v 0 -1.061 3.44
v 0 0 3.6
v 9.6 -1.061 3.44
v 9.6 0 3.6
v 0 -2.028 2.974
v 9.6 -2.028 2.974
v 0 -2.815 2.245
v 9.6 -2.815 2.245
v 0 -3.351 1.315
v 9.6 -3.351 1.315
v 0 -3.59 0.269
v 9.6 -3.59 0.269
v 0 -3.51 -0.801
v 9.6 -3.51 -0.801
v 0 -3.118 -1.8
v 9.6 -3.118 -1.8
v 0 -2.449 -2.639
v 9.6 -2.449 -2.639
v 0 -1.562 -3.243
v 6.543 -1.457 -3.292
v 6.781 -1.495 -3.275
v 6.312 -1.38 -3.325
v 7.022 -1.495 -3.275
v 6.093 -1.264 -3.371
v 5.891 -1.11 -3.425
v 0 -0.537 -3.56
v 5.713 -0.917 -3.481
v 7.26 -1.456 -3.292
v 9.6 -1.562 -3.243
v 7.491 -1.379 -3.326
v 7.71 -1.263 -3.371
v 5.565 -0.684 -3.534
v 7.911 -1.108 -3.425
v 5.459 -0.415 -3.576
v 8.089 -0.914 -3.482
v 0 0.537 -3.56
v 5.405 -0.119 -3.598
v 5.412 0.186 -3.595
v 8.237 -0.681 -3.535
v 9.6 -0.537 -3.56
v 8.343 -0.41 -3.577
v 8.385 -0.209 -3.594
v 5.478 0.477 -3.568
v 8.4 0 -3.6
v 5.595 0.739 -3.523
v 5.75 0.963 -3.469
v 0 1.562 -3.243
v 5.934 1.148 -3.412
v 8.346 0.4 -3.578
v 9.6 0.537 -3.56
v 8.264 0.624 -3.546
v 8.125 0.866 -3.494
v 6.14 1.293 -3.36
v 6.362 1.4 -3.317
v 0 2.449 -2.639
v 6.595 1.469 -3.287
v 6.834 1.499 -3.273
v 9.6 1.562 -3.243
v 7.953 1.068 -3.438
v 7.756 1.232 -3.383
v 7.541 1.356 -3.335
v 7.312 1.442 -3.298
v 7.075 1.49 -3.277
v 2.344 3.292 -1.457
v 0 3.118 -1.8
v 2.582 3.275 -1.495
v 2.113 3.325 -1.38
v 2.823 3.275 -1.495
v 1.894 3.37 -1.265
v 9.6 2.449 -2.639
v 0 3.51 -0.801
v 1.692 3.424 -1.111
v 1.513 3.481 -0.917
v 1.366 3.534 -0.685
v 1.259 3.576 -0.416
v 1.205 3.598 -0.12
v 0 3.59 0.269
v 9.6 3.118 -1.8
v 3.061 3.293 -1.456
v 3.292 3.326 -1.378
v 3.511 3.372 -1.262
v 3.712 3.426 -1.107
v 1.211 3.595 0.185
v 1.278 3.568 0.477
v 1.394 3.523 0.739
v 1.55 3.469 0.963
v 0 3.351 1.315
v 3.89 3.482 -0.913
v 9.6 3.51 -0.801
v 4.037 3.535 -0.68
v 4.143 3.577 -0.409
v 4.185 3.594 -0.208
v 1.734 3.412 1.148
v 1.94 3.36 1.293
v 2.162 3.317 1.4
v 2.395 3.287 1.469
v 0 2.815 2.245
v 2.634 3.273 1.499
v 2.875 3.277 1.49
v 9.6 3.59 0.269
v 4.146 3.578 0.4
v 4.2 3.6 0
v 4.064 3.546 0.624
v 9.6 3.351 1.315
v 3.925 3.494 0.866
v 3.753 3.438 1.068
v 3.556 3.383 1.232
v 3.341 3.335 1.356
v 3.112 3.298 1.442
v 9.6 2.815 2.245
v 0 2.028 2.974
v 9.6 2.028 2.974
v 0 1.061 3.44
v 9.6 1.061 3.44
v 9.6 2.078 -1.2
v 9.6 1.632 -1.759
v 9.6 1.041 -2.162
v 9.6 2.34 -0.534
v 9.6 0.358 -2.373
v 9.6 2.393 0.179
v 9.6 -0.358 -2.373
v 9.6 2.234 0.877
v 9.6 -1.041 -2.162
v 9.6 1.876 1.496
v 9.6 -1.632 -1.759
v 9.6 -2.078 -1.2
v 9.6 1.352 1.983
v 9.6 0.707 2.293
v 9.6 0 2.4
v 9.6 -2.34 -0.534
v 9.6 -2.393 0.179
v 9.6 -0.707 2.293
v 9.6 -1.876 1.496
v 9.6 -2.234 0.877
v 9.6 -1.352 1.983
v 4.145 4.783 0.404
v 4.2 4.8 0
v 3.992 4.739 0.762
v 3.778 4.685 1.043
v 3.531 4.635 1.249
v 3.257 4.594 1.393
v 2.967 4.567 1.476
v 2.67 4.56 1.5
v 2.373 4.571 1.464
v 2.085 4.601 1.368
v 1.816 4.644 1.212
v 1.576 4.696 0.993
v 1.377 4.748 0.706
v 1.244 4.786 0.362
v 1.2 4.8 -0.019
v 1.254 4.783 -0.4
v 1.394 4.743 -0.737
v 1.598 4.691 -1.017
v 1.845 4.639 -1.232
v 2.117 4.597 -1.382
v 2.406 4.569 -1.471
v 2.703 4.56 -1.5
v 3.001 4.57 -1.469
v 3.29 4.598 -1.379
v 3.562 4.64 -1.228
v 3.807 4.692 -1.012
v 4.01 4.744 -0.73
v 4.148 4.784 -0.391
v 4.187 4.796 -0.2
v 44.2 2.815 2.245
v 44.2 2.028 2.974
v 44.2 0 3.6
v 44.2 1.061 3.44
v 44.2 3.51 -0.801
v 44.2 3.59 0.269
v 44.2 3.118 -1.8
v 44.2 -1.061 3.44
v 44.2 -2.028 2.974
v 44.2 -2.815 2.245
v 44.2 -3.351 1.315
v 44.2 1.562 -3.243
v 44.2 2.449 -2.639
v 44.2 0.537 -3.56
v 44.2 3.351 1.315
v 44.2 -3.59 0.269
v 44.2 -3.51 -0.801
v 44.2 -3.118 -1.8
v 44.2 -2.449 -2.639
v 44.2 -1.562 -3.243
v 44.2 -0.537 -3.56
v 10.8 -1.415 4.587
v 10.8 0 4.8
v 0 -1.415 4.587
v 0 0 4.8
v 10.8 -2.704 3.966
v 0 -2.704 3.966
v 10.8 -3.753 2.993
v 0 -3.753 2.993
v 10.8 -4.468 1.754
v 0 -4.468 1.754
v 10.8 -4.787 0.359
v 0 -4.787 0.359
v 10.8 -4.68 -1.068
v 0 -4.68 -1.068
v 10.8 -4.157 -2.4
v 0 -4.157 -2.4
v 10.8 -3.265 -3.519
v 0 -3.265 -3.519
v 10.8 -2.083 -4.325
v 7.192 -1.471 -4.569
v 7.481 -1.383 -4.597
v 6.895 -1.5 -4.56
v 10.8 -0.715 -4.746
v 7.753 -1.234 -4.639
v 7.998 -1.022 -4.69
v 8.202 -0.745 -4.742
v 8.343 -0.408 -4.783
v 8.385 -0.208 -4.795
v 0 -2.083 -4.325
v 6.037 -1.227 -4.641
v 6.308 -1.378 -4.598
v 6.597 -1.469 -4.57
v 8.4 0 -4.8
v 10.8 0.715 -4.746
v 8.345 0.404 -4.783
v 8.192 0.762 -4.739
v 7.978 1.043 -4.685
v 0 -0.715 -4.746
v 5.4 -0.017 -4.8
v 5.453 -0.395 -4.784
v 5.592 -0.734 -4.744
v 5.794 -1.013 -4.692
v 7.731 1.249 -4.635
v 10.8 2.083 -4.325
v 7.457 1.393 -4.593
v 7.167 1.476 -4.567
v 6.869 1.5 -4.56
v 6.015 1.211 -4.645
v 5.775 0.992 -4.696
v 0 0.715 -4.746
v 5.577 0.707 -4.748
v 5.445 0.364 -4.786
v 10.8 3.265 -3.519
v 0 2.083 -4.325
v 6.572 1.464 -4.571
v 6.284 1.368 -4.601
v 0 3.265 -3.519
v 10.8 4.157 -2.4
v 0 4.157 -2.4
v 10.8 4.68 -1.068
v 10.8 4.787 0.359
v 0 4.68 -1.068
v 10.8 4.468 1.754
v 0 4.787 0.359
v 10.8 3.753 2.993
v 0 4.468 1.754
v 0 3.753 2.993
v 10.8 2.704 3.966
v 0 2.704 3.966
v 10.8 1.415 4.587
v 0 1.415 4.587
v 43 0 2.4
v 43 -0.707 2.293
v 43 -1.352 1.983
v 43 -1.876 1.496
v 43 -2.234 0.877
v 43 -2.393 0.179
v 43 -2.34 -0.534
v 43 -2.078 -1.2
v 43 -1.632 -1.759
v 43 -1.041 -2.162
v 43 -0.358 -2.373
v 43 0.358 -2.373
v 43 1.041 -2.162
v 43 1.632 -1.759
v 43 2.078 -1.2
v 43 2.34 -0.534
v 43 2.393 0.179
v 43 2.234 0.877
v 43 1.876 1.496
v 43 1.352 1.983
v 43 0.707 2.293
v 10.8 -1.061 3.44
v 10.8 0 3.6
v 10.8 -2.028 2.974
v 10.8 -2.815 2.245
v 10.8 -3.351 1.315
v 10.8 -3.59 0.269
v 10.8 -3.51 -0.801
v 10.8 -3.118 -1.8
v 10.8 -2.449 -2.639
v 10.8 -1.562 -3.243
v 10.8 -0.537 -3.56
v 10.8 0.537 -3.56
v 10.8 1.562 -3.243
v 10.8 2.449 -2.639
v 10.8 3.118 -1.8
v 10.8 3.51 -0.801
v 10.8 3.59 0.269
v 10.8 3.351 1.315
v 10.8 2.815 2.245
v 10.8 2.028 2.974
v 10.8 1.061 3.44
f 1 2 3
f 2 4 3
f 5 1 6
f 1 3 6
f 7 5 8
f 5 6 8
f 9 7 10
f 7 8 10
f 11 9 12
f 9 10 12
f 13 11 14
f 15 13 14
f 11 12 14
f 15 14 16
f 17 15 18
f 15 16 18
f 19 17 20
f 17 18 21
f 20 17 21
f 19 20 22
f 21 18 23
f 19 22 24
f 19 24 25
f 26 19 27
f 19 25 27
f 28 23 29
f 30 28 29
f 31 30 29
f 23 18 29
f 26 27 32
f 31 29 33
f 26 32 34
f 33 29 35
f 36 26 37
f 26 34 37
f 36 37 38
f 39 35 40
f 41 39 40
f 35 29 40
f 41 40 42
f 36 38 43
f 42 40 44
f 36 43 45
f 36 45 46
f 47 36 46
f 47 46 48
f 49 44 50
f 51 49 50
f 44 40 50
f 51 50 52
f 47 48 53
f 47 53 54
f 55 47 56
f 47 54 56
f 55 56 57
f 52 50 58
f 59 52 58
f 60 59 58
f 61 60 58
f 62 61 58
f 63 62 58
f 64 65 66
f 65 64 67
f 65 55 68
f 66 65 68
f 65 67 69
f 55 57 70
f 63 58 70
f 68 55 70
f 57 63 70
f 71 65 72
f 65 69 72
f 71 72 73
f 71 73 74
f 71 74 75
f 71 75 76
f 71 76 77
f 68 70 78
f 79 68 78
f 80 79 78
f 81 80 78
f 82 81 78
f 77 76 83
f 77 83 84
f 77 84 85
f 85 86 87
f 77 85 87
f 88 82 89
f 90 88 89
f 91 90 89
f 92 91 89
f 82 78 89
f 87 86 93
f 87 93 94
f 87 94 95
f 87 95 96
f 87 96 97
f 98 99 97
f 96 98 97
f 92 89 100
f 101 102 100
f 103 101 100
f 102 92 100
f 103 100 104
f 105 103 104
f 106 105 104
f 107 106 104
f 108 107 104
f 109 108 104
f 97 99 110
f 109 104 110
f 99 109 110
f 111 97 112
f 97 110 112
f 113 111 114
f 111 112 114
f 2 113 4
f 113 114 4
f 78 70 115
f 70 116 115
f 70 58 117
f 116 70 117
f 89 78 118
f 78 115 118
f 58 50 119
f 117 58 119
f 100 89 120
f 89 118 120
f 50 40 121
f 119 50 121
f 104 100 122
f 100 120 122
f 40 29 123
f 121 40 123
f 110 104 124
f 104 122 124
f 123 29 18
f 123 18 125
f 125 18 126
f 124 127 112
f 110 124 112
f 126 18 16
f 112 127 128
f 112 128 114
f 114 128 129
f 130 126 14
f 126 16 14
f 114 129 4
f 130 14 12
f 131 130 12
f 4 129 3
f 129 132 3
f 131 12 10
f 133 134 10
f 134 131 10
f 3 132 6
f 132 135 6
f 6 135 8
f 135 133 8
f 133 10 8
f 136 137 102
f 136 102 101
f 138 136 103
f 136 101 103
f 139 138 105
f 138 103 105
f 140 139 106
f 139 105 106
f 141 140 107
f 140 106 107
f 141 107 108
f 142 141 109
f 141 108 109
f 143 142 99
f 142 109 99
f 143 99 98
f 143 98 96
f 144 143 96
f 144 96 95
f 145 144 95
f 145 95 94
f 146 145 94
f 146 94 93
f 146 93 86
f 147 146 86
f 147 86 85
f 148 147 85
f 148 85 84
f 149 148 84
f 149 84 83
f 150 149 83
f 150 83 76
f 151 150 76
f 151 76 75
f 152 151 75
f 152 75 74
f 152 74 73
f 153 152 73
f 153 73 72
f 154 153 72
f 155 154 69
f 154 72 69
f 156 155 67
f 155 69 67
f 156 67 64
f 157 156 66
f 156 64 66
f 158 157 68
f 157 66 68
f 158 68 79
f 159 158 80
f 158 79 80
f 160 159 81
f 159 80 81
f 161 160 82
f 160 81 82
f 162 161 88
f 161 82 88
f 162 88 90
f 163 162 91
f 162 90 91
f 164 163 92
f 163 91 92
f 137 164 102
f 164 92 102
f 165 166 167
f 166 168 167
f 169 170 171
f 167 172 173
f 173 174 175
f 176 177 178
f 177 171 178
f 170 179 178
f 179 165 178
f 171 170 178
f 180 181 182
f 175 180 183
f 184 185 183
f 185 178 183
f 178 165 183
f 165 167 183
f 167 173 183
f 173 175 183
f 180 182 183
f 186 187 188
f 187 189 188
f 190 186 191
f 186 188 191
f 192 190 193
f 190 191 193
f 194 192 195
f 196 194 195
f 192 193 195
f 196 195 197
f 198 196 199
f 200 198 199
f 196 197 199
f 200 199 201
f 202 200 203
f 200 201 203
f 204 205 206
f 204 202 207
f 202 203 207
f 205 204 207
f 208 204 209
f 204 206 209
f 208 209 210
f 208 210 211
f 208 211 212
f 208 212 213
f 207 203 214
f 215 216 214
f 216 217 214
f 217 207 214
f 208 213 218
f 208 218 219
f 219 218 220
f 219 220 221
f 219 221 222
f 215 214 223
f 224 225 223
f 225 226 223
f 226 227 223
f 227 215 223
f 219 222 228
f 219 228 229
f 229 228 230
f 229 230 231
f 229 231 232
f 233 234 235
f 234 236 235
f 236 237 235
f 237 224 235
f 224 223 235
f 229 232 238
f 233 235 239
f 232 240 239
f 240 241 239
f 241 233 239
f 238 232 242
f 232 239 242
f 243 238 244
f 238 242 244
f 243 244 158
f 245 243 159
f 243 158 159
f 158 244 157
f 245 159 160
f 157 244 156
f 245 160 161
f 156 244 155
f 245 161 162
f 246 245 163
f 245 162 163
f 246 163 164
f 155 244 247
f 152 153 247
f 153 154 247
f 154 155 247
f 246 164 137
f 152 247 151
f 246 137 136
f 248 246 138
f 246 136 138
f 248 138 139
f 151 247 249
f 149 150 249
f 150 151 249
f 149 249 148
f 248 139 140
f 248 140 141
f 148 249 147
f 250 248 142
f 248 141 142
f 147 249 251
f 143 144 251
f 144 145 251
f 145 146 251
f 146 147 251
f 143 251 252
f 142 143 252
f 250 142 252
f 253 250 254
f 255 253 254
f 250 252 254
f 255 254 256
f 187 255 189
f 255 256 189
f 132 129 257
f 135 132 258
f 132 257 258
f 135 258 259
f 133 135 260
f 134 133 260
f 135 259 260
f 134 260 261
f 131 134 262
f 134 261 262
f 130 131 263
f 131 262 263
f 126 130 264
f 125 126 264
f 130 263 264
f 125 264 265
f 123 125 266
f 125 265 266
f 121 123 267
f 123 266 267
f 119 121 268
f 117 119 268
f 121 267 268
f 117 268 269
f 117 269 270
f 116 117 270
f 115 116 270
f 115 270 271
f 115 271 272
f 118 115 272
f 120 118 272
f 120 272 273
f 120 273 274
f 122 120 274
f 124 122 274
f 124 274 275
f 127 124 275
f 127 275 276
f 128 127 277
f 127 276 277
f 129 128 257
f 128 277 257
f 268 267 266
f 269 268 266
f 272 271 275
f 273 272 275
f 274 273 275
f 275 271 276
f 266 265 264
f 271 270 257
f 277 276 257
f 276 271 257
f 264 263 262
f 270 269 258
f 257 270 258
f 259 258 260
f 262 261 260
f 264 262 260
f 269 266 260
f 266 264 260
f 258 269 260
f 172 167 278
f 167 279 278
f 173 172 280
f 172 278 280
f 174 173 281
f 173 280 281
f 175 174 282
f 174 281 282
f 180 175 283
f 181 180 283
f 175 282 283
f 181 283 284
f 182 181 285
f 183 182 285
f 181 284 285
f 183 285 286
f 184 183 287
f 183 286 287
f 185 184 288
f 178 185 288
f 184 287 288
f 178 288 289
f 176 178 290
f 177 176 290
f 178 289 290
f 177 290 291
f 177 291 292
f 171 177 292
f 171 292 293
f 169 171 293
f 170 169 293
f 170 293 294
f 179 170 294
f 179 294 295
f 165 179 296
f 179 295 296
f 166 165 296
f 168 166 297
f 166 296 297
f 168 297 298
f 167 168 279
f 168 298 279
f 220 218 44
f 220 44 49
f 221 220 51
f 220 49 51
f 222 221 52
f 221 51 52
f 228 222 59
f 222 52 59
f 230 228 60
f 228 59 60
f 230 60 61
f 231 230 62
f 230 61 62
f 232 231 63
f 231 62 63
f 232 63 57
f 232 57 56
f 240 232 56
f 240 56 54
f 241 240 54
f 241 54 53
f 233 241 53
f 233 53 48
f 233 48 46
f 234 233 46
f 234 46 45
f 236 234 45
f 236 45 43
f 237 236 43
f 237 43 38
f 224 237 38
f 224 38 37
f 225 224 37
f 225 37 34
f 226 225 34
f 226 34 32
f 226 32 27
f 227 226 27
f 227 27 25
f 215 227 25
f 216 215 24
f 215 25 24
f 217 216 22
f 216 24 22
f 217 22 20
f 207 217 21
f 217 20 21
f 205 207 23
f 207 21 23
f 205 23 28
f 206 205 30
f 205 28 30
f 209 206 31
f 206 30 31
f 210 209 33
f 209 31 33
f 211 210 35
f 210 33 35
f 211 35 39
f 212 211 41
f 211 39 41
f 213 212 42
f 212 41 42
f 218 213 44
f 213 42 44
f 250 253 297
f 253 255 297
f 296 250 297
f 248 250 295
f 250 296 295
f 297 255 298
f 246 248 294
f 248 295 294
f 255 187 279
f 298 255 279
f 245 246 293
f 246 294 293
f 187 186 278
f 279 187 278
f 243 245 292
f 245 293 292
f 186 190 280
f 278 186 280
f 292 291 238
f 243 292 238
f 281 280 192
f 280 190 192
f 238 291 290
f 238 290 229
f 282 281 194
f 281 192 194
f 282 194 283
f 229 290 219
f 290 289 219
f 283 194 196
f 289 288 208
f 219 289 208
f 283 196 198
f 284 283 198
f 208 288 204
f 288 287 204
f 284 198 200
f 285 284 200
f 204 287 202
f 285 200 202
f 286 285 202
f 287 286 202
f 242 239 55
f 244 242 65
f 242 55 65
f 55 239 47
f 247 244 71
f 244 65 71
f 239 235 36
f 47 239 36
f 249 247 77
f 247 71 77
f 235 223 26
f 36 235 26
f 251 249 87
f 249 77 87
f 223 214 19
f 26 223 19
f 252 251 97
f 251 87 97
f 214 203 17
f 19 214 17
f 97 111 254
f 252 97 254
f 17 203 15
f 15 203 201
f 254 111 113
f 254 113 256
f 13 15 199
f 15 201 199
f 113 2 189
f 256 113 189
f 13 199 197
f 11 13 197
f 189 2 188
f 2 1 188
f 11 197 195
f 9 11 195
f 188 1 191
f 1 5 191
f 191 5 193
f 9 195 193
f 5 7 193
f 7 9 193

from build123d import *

# Parameters (mm, degrees)
F3_R     = 1.5
F5_DEPTH = 4.801
F4_R     = 1.5
F6_DEPTH = 4.801


with BuildPart() as f2:
    # F1 (on Front) → F2 (revolve)
    with BuildSketch(Plane.XZ):
        Polygon((0, 4.8), (0, 3.6), (9.6, 3.6), (9.6, 2.4), (18.6, 2.4), (43, 2.4), (43, 0), (44.2, 0), (44.2, 3.6), (18.6, 3.6), (10.8, 3.6), (10.8, 4.8), align=None)
    revolve(axis=Axis((43.6, 0, 0), (1, 0, 0)))

    # F3 (on Front) → F5 (cut, through all)
    with BuildSketch(Plane.XZ):
        with Locations((2.7, 0)):
            Circle(F3_R)
    extrude(amount=-F5_DEPTH, mode=Mode.SUBTRACT)

    # F4 (on Top) → F6 (cut, through all)
    with BuildSketch(Plane.XY):
        with Locations((6.9, 0)):
            Circle(F4_R)
    extrude(amount=-F6_DEPTH, mode=Mode.SUBTRACT)


solid = f2.part
